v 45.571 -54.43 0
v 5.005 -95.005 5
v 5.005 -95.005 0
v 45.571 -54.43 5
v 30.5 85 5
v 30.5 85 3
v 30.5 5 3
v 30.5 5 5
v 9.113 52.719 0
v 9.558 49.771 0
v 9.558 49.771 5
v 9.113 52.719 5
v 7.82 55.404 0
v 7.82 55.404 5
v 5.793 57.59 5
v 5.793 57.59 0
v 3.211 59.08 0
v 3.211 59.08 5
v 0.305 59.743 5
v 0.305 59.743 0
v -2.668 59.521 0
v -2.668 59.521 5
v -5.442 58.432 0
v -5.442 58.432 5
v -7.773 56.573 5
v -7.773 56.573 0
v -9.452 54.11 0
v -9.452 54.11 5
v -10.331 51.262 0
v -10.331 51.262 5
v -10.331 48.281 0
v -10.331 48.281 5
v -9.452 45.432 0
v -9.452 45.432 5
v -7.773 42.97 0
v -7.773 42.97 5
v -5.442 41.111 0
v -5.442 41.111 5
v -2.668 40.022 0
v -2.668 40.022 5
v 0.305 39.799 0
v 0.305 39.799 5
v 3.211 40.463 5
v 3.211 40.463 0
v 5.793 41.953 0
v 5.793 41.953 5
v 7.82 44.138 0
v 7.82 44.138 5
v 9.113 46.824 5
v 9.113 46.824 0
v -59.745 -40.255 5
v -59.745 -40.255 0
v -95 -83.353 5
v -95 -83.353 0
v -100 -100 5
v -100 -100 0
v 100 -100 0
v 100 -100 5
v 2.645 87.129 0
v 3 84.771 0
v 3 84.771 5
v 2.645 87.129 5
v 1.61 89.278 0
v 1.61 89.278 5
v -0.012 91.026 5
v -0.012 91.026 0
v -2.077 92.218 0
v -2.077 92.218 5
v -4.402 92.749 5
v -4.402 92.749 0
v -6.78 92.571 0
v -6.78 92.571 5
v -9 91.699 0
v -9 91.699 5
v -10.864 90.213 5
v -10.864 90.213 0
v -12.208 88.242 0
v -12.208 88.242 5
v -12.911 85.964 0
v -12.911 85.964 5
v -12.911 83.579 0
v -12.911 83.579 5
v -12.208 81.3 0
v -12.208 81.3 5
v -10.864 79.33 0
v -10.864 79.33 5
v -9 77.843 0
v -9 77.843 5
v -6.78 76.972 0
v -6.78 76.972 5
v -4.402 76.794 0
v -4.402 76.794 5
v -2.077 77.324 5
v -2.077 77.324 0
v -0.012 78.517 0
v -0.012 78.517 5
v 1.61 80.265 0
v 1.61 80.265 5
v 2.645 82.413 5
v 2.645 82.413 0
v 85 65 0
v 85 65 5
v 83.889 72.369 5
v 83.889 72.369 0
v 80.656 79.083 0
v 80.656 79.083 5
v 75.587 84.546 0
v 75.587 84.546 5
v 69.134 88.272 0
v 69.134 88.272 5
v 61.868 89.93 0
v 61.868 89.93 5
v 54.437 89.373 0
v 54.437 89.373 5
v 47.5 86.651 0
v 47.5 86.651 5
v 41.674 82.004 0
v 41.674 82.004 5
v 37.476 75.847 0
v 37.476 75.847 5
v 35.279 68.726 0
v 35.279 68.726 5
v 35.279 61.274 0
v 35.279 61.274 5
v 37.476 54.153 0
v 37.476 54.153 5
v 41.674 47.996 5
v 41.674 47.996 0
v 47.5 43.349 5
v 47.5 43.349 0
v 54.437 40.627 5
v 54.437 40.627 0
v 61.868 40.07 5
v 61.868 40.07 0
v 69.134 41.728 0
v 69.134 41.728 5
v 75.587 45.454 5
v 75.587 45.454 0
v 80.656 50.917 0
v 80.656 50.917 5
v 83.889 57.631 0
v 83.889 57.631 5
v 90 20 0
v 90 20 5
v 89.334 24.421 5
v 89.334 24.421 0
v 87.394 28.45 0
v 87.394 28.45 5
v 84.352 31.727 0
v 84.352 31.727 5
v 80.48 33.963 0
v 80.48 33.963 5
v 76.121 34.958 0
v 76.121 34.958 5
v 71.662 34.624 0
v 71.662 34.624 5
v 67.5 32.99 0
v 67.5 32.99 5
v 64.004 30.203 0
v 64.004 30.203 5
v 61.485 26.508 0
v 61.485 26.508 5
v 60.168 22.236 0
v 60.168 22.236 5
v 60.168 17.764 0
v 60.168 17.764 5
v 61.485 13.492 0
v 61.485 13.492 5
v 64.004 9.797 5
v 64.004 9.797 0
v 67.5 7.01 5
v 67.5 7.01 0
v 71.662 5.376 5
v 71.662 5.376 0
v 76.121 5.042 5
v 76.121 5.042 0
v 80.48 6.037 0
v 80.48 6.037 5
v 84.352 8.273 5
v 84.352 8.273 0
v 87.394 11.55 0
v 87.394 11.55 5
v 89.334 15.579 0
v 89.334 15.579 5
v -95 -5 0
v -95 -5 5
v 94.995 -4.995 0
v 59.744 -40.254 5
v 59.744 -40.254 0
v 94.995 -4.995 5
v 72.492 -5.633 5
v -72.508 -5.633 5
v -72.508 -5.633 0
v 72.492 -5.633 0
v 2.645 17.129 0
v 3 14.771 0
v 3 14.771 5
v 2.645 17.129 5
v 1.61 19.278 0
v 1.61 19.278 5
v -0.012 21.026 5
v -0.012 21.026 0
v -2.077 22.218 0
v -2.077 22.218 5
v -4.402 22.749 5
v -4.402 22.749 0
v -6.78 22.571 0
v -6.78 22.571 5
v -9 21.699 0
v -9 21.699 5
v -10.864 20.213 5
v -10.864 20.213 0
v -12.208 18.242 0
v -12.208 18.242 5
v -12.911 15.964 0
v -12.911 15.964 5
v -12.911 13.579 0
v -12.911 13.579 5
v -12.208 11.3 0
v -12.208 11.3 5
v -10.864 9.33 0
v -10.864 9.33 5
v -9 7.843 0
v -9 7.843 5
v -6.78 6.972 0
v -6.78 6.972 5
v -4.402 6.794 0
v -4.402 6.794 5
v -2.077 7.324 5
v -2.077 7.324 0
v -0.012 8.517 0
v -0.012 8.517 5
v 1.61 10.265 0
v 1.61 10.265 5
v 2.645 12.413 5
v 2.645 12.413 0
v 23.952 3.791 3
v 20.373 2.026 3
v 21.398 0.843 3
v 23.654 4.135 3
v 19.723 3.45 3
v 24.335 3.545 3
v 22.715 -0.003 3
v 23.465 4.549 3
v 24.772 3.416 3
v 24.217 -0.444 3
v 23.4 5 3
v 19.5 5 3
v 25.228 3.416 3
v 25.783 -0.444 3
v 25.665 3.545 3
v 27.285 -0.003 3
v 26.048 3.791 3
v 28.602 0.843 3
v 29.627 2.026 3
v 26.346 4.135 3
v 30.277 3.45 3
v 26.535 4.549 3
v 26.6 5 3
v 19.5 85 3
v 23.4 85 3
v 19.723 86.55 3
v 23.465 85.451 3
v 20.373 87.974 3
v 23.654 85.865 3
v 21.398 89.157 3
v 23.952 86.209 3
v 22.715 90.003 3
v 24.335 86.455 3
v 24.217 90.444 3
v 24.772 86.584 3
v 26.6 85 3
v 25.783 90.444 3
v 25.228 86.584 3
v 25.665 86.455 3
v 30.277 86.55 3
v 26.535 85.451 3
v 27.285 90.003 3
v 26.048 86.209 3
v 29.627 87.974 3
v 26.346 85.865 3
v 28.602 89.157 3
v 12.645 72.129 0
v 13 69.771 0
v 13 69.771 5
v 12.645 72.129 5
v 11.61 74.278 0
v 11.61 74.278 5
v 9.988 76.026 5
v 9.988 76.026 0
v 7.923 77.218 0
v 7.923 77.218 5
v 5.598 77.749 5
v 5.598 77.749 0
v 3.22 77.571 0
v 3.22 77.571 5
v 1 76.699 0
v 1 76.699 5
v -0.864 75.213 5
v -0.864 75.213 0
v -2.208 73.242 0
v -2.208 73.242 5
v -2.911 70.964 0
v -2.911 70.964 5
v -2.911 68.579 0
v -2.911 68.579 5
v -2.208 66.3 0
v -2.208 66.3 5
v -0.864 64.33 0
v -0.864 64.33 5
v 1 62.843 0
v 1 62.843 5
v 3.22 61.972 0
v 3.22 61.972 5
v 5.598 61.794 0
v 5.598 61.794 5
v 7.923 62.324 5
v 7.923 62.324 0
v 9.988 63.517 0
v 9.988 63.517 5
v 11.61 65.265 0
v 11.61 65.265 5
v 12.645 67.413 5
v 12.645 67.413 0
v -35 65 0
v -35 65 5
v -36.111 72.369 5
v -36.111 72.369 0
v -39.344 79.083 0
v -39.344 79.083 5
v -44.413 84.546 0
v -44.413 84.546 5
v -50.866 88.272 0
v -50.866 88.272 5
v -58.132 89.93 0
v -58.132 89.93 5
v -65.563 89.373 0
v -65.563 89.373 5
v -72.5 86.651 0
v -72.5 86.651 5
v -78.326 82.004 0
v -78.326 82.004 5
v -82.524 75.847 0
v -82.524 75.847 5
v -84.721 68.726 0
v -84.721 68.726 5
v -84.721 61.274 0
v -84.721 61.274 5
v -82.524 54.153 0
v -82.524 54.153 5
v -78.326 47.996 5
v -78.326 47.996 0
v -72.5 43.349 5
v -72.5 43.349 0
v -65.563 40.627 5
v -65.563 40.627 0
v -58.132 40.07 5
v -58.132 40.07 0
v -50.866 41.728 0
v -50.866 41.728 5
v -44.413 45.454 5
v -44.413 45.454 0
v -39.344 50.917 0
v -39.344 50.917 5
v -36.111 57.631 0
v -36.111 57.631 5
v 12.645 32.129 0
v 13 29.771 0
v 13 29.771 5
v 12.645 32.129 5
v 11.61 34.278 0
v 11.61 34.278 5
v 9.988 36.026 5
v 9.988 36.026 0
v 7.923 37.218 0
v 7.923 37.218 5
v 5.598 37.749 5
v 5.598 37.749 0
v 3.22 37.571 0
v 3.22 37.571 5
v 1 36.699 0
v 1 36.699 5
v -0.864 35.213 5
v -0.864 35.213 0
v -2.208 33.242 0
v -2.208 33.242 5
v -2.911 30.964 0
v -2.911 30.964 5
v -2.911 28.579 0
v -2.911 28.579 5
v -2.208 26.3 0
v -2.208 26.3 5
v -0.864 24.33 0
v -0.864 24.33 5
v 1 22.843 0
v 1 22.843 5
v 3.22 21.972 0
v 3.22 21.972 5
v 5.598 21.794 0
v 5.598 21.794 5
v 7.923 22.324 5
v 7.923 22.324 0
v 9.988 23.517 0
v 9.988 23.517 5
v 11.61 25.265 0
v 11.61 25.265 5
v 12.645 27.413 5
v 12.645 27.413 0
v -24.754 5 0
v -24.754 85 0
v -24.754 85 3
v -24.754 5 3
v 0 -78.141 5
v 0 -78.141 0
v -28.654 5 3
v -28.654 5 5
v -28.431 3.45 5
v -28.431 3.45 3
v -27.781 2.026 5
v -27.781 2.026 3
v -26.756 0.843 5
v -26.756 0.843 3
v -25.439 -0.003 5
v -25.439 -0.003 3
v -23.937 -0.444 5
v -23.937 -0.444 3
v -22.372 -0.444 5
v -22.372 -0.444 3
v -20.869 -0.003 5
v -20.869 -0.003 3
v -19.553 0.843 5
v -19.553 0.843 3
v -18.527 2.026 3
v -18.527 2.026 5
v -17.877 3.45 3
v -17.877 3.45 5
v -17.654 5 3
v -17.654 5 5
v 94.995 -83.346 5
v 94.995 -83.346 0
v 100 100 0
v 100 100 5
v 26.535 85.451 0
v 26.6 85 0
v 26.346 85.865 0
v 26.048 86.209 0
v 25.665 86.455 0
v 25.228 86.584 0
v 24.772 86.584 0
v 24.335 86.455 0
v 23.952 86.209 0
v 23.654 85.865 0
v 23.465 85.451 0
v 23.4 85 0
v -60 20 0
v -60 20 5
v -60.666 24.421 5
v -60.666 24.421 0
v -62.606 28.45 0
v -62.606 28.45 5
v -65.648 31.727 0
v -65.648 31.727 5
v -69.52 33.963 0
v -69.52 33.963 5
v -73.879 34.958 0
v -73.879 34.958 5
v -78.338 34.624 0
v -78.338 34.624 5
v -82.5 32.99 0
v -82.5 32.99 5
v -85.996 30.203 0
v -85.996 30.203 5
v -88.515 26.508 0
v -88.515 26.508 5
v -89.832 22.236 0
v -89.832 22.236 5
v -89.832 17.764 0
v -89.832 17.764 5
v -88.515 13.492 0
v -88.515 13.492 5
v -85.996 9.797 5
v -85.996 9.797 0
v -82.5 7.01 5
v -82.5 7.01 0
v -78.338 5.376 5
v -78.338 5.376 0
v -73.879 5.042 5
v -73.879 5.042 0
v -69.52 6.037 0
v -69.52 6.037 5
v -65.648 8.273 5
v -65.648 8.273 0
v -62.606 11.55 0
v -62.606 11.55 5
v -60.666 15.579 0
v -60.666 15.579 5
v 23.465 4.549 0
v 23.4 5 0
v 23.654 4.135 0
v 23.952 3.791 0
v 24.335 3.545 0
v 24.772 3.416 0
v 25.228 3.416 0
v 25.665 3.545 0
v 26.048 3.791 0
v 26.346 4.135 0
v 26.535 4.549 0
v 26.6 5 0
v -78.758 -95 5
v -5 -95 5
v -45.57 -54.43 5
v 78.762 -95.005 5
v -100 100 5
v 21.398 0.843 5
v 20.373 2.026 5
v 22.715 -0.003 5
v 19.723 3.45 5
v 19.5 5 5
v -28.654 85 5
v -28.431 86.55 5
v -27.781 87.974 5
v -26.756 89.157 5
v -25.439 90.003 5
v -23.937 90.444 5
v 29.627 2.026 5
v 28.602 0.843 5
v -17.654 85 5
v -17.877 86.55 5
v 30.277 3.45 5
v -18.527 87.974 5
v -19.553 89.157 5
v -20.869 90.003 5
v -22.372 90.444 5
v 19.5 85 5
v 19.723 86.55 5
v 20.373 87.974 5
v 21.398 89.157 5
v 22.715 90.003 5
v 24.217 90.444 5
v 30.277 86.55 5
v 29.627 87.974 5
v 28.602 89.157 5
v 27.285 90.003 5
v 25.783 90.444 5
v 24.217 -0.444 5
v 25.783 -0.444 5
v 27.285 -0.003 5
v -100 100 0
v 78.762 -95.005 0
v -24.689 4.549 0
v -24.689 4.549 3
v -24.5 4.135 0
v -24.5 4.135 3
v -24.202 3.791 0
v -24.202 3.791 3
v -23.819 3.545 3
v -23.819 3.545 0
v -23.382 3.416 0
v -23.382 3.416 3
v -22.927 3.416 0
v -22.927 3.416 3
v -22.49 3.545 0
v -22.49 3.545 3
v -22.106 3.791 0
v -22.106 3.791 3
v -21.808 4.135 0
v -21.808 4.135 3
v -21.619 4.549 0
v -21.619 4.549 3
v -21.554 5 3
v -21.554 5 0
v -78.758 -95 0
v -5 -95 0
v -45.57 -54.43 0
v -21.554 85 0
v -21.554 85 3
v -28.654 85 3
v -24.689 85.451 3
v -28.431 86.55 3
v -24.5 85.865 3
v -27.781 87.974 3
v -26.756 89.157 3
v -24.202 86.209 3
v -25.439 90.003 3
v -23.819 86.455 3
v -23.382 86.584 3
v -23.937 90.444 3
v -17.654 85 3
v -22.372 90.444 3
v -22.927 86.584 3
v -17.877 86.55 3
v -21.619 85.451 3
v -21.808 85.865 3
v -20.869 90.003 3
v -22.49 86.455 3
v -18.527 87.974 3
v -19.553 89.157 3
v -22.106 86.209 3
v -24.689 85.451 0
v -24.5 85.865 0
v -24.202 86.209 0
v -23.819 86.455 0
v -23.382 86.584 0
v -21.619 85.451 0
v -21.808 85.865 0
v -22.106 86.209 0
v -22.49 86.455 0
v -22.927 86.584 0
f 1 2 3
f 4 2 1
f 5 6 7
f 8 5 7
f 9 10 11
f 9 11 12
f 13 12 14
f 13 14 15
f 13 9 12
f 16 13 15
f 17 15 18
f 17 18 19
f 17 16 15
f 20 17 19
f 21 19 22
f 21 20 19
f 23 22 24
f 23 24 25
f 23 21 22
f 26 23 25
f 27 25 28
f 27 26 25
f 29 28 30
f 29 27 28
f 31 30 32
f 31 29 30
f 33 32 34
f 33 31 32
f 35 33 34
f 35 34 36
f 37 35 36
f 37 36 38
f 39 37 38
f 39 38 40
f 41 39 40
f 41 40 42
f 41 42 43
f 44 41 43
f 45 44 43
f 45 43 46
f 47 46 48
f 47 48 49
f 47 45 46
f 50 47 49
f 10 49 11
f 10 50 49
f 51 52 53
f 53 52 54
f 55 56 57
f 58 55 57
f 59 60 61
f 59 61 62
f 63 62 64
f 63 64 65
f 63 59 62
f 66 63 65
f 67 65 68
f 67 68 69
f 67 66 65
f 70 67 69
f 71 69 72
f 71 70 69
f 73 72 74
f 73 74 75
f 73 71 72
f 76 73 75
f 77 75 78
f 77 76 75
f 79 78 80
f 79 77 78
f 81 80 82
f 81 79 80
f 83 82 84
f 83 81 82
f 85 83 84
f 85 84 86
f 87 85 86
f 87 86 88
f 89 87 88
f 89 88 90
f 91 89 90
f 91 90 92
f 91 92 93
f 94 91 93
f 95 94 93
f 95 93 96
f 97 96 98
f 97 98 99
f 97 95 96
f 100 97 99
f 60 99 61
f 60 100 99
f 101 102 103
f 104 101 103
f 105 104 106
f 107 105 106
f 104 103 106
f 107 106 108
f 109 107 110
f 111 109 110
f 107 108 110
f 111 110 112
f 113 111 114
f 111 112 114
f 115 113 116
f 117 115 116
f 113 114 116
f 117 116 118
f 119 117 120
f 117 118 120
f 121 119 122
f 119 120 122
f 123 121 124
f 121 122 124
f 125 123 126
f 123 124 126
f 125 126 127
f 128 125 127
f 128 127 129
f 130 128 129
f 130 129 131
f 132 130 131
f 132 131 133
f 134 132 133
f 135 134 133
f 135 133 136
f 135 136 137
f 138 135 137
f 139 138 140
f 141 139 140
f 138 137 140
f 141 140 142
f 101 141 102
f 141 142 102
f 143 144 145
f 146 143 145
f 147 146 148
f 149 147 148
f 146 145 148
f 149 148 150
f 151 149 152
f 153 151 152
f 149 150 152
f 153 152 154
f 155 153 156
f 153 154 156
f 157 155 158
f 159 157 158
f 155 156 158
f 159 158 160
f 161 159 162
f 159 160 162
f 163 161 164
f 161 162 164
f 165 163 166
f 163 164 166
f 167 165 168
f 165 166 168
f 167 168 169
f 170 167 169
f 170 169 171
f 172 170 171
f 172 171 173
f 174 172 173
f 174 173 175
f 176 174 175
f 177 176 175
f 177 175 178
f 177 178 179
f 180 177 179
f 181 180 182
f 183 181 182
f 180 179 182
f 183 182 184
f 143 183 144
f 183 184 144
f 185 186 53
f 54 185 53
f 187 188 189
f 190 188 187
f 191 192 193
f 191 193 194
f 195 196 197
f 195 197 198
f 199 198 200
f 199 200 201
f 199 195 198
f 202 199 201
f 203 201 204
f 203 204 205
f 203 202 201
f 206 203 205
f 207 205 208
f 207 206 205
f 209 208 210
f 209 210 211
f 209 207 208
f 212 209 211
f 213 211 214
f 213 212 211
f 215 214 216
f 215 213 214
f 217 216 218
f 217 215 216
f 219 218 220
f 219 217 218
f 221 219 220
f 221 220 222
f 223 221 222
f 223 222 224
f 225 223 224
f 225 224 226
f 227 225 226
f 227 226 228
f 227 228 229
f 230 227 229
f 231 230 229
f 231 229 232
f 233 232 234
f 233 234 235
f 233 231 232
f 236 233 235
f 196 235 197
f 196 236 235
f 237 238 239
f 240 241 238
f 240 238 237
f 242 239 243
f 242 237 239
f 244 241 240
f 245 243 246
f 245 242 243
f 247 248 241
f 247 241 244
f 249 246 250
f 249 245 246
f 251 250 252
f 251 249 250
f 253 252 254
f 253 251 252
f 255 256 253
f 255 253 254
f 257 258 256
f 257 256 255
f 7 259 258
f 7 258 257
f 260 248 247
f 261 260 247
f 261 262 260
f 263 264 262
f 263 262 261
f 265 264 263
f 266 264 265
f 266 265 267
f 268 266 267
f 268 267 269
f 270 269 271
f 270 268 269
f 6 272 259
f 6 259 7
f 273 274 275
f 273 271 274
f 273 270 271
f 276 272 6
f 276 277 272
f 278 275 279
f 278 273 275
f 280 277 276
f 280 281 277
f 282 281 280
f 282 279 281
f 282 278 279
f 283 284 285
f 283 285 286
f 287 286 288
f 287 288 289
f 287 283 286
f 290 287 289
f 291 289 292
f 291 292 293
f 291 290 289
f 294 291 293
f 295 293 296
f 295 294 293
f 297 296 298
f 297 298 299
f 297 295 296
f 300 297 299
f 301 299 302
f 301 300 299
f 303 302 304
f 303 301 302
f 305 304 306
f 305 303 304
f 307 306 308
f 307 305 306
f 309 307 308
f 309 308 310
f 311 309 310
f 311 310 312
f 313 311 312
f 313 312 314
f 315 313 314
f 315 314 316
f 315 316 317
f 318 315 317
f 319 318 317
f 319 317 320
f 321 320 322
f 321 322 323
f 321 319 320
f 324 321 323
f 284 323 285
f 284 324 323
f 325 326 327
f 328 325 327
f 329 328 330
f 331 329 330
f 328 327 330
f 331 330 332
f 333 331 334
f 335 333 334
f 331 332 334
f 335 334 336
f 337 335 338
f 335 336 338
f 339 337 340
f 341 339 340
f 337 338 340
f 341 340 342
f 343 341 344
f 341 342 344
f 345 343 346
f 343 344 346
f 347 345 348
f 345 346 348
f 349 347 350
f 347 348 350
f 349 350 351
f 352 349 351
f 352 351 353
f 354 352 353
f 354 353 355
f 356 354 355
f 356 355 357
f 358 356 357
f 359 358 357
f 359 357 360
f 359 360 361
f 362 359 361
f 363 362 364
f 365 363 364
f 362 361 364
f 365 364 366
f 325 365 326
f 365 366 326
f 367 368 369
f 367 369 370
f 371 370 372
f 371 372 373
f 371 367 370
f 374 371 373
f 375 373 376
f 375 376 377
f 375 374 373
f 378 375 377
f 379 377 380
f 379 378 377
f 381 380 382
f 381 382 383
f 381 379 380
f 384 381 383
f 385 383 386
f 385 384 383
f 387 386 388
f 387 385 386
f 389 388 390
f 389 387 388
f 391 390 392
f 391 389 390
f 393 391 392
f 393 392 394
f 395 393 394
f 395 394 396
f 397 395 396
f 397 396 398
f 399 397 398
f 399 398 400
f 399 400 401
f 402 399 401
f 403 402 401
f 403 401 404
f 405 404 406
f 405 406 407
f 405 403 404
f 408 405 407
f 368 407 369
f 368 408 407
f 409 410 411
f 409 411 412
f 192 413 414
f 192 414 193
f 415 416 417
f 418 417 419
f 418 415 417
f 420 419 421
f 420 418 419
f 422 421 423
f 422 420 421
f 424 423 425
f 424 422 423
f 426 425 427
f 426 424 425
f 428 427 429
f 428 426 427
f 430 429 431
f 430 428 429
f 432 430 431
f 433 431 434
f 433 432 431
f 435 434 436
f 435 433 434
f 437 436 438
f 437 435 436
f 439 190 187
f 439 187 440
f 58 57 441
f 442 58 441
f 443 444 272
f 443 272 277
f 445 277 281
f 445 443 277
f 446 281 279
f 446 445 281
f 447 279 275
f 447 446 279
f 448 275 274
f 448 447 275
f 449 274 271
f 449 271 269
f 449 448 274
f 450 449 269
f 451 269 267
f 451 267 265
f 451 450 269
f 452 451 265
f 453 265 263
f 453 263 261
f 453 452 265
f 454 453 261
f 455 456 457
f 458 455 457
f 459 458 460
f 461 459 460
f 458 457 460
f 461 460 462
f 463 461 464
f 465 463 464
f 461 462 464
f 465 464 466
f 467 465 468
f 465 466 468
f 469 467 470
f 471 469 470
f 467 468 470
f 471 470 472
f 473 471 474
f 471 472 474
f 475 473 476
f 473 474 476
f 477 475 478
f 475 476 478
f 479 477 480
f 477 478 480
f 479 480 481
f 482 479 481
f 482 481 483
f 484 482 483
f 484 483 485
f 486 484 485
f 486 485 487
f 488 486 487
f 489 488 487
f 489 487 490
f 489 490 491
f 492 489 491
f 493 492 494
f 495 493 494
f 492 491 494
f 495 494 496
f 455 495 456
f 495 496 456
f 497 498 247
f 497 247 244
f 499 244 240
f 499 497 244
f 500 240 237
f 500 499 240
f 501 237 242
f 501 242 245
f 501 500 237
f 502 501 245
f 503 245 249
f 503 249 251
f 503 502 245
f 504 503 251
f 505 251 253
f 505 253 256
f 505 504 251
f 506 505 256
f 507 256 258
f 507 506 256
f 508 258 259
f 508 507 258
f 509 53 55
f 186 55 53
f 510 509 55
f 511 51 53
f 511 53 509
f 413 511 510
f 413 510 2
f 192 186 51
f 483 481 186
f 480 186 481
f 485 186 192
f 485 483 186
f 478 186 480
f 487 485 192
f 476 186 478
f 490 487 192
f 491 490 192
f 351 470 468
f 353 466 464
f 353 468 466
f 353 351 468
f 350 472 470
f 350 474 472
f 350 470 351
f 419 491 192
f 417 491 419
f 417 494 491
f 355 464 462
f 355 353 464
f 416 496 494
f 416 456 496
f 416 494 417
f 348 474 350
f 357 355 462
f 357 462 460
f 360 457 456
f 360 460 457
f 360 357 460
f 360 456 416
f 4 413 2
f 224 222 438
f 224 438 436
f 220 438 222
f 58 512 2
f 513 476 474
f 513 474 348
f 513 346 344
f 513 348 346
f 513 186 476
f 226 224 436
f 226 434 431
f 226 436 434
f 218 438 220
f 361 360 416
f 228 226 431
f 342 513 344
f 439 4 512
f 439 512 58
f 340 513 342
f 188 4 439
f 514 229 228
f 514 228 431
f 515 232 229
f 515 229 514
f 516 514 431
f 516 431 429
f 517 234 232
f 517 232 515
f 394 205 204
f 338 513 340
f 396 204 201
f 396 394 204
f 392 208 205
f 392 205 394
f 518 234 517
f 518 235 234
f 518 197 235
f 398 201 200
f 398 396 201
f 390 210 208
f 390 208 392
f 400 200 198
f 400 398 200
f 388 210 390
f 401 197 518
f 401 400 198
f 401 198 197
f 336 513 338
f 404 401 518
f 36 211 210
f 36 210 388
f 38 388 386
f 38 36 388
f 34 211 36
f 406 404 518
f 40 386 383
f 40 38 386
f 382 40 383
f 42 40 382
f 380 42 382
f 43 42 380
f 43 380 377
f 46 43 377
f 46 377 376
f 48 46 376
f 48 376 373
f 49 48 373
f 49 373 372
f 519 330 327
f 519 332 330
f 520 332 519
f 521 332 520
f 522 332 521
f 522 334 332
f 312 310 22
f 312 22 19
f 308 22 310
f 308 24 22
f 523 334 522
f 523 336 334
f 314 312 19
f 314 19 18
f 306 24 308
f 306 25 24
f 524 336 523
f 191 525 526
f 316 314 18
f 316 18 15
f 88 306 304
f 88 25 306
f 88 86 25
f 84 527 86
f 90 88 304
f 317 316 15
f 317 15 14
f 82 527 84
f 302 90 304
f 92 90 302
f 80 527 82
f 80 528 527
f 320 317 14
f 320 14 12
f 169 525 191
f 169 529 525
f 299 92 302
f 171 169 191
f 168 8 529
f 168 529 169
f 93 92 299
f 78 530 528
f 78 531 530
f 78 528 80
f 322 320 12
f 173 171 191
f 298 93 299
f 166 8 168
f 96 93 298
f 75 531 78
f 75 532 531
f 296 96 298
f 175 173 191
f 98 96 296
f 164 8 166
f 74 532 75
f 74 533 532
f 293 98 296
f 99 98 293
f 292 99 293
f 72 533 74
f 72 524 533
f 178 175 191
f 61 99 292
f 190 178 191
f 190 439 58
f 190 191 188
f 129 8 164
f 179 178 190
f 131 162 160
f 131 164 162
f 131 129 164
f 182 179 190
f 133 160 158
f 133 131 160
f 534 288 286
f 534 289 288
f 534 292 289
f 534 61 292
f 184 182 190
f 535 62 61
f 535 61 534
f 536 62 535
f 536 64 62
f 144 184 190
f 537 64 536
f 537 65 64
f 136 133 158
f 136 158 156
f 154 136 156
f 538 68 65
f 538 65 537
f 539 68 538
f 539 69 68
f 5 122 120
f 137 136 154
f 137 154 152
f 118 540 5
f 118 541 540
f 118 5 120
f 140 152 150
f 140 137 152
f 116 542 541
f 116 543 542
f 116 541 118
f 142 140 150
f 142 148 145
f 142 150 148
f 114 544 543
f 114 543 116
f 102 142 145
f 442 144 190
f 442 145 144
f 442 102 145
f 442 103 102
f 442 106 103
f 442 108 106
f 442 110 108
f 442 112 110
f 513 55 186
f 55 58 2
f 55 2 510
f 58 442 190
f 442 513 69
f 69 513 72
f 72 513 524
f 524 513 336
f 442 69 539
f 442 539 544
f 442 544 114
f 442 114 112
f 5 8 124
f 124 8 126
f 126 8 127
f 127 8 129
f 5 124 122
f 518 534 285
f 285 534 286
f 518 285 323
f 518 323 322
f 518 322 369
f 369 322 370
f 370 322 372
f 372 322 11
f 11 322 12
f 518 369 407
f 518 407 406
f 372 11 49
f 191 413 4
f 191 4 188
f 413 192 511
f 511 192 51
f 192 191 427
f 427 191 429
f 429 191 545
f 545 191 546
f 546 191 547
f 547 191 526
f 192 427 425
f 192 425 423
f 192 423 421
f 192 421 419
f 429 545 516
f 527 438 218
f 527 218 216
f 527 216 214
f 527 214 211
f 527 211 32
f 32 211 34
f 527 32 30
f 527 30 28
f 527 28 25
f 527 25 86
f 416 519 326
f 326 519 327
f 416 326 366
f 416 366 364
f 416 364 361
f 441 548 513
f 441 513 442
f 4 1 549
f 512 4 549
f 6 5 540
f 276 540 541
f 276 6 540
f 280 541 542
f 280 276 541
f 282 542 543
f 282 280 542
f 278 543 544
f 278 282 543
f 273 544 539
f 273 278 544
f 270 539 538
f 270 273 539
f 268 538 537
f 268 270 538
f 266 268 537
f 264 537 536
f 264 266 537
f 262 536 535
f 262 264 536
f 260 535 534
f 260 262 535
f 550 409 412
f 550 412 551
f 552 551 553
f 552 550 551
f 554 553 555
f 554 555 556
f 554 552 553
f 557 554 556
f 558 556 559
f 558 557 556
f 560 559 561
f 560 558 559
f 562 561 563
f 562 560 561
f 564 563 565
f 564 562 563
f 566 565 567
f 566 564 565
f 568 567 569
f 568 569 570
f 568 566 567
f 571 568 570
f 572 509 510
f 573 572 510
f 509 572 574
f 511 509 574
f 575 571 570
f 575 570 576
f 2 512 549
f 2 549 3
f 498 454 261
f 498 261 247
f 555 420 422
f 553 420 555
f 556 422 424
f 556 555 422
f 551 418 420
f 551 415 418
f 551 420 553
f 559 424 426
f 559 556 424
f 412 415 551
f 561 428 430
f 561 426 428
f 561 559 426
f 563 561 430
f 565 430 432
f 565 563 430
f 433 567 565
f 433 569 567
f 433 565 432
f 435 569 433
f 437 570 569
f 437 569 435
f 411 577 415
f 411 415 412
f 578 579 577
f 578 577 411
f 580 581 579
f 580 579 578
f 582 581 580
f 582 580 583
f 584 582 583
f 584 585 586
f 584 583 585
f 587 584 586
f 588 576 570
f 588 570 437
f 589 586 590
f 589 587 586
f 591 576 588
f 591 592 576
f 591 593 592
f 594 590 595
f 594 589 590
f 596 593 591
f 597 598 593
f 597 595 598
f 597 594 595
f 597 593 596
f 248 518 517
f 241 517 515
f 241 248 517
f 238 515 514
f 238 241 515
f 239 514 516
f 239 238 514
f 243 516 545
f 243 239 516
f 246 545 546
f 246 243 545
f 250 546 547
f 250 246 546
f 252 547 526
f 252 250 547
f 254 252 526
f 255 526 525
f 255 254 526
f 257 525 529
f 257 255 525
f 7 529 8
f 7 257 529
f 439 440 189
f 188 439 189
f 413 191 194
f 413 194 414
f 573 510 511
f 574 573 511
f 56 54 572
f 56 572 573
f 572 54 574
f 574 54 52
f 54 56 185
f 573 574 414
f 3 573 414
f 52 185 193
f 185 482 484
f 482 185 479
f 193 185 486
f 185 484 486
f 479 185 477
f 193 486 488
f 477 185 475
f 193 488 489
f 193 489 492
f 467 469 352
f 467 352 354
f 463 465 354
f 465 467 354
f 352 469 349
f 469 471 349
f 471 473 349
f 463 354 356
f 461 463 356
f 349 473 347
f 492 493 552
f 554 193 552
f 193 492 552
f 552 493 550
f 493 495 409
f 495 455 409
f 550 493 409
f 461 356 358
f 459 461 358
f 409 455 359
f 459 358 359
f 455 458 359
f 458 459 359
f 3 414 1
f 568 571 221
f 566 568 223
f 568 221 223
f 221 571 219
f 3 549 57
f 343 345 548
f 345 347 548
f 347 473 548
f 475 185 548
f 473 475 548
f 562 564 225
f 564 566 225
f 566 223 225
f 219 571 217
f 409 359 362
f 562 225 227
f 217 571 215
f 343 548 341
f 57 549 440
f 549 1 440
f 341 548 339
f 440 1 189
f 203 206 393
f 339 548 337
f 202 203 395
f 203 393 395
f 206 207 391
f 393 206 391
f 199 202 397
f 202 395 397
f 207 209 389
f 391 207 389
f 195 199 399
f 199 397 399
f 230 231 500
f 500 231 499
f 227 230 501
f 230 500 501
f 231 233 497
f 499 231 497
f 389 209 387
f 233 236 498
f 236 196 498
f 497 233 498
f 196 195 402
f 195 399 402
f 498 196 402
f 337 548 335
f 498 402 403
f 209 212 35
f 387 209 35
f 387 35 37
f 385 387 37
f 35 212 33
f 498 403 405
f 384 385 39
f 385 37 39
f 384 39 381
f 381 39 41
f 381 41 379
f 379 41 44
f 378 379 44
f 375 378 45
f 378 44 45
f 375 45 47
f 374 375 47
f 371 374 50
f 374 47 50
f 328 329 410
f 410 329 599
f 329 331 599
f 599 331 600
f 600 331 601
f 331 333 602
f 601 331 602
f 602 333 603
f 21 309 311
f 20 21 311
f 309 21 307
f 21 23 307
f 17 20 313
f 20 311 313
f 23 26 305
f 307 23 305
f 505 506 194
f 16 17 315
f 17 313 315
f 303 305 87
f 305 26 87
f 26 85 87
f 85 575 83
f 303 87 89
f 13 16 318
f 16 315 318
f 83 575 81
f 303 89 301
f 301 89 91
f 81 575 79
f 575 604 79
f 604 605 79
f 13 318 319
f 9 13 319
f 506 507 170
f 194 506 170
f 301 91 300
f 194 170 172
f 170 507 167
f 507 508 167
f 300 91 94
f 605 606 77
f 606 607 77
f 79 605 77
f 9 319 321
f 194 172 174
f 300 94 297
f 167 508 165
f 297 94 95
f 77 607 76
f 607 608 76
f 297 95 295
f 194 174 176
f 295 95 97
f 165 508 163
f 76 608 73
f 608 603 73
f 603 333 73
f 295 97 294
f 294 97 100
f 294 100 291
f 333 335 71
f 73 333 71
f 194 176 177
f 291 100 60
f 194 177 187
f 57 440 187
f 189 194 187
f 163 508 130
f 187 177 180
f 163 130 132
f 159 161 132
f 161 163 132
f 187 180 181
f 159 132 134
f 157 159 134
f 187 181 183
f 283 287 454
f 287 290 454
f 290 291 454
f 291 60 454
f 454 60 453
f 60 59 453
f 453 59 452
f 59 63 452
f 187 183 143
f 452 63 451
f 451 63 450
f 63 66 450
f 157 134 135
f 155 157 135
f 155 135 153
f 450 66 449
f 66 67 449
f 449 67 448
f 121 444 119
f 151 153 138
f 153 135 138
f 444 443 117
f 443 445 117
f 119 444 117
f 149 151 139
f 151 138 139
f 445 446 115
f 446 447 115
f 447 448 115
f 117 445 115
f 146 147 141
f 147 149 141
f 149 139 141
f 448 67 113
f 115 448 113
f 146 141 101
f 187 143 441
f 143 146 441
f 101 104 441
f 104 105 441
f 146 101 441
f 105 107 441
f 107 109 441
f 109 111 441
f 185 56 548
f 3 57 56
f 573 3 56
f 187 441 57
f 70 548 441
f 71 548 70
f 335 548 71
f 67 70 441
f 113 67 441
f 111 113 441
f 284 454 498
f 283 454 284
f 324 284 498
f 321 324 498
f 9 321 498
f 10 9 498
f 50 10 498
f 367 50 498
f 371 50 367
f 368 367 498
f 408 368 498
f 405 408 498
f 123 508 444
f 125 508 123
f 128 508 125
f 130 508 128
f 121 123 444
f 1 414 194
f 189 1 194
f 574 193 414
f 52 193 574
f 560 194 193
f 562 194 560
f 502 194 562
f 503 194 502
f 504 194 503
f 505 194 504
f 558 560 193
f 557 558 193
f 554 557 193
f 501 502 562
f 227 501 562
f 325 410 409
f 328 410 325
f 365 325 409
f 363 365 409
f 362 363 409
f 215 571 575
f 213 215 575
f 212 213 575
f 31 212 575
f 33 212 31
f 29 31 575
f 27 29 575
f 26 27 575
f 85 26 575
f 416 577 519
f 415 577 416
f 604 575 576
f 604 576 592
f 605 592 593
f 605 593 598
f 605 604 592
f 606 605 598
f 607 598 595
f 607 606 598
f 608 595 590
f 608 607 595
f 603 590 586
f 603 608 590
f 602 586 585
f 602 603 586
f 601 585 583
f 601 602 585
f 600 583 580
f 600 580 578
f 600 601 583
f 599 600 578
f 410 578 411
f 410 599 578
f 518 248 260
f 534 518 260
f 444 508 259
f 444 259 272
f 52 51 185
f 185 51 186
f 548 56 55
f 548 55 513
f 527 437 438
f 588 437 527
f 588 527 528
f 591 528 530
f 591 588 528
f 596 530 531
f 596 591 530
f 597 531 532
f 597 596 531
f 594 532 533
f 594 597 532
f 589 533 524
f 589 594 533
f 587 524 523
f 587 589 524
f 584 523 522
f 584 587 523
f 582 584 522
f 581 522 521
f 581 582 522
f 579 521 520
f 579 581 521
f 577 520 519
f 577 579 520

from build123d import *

# Parameters (mm, degrees)
SKETCH_W        = 200
SKETCH_H        = 200
PAD_DEPTH       = 5
SKETCH001_W     = 28.435717
SKETCH001_H     = 96.211274
SKETCH001_W_2   = 31.50908
SKETCH001_H_2   = 95.352357
PAD001_DEPTH    = 3
POCKET_DEPTH    = 5
SKETCH003_R     = 25
SKETCH003_R_2   = 15
POCKET001_DEPTH = 5
SKETCH004_R     = 8
SKETCH004_R_2   = 10
POCKET002_DEPTH = 5
PAD002_DEPTH    = 5


with BuildPart() as part:
    # Sketch → Pad (new body)
    with BuildSketch(Plane.XY):
        Rectangle(SKETCH_W, SKETCH_H)
        with BuildLine():
            ThreePointArc((-17.654241, 85), (-23.154241, 90.5), (-28.654241, 85))
            Line((-28.654241, 85), (-28.654241, 5))
            ThreePointArc((-28.654241, 5), (-23.154241, -0.5), (-17.654241, 5))
            Line((-17.654241, 5), (-17.654241, 85))
        make_face(mode=Mode.SUBTRACT)
        with BuildLine():
            ThreePointArc((30.5, 84.999994), (25, 90.499994), (19.5, 84.999994))
            Line((19.5, 5.000005), (19.5, 84.999994))
            ThreePointArc((19.5, 5.000005), (25, -0.499995), (30.5, 5.000005))
            Line((30.5, 84.999994), (30.5, 5.000005))
        make_face(mode=Mode.SUBTRACT)
    extrude(amount=PAD_DEPTH)

    # Sketch001 → Pad001 (join)
    with BuildSketch(Plane.XY):
        with Locations((-24.708835, 45.889106)):
            Rectangle(SKETCH001_W, SKETCH001_H)
        with BuildLine():
            ThreePointArc((-21.554241, 85), (-23.154241, 86.6), (-24.754241, 85))
            Line((-24.754241, 85), (-24.754241, 5))
            ThreePointArc((-24.754241, 5), (-23.154241, 3.4), (-21.554241, 5))
            Line((-21.554241, 5), (-21.554241, 85))
        make_face(mode=Mode.SUBTRACT)
        with Locations((28.35321, 45.459647)):
            Rectangle(SKETCH001_W_2, SKETCH001_H_2)
        with BuildLine():
            ThreePointArc((26.6, 85.000005), (25, 86.600005), (23.4, 85.000005))
            Line((23.4, 85.000005), (23.4, 5.000005))
            ThreePointArc((23.4, 5.000005), (25, 3.400005), (26.6, 5.000005))
            Line((26.6, 5.000005), (26.6, 85.000005))
        make_face(mode=Mode.SUBTRACT)
    extrude(amount=PAD001_DEPTH)

    # Sketch002 (on Face5 of Pad001) → Pocket (cut)
    with BuildSketch(Plane.XY.offset(5)):
        Polygon((-95, -5), (-95, -95), (-5, -95), align=None)
        Polygon((94.994808, -4.99544), (94.994808, -95.00456), (5.005192, -95.00456), align=None)
        Polygon((0, -78.141), (-72.507856, -5.633144), (72.492144, -5.633144), align=None)
    extrude(amount=-POCKET_DEPTH, mode=Mode.SUBTRACT)

    # Sketch003 (on Face5 of Pocket) → Pocket001 (cut)
    with BuildSketch(Plane.XY.offset(5)):
        with Locations((-60, 65)):
            Circle(SKETCH003_R)
        with Locations((-75, 20)):
            Circle(SKETCH003_R_2)
        with Locations((75, 20)):
            Circle(SKETCH003_R_2)
        with Locations((60, 65)):
            Circle(SKETCH003_R)
    extrude(amount=-POCKET001_DEPTH, mode=Mode.SUBTRACT)

    # Sketch004 → Pocket002 (cut)
    with BuildSketch(Plane.XY):
        with Locations((-5, 14.771259)):
            Circle(SKETCH004_R)
        with Locations((5, 29.771259)):
            Circle(SKETCH004_R)
        with Locations((-0.442374, 49.771259)):
            Circle(SKETCH004_R_2)
        with Locations((-5, 84.771259)):
            Circle(SKETCH004_R)
        with Locations((5, 69.771259)):
            Circle(SKETCH004_R)
    extrude(amount=POCKET002_DEPTH, mode=Mode.SUBTRACT)

    # Sketch005 → Pad002 (join)
    with BuildSketch(Plane.XY):
        Polygon((-97.778632, -86.74954), (-95.572601, -99.607414), (-82.526855, -99.607414), (-42.874022, -51.133889), (-57.164055, -37.100334), align=None)
        Polygon((57.164055, -37.100334), (42.874022, -51.133889), (82.526855, -99.607414), (95.572601, -99.607414), (97.778632, -86.74954), align=None)
    extrude(amount=PAD002_DEPTH)


solid = part.part
